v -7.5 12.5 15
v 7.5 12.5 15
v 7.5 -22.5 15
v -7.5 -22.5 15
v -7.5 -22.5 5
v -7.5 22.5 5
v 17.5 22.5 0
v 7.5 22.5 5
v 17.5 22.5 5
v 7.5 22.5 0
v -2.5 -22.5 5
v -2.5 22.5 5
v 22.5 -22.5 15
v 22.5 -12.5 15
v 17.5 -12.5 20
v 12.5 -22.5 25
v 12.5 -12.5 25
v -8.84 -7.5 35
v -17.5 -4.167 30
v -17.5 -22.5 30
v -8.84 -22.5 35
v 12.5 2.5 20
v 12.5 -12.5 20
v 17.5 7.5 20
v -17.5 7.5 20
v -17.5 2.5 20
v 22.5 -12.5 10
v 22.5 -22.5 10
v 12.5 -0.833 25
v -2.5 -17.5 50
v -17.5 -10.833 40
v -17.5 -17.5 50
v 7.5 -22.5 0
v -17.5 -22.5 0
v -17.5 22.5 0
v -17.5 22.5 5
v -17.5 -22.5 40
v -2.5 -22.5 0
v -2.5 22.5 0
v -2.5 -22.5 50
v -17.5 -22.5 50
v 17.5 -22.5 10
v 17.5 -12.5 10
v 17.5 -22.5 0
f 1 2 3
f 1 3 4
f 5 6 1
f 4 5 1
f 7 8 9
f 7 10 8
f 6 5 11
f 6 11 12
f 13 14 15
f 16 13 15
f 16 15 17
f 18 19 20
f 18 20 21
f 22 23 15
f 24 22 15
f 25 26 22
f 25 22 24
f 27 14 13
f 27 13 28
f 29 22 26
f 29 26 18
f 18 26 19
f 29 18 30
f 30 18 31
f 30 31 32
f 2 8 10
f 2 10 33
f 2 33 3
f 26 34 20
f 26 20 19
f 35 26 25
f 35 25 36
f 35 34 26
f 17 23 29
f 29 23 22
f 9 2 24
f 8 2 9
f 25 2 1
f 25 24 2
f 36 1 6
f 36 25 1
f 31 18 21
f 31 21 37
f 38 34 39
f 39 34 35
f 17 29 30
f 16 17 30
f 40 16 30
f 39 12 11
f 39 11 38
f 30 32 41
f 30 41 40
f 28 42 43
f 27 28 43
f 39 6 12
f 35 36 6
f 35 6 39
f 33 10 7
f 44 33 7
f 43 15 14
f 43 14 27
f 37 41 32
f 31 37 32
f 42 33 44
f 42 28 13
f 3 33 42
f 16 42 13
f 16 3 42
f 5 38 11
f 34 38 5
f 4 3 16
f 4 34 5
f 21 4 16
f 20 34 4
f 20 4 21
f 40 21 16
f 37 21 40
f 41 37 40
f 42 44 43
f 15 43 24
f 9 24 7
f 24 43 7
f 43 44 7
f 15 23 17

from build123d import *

# Parameters (mm, degrees)
SKETCH1_W           = 35
SKETCH1_H           = 45
BOSS_EXTRUDE2_DEPTH = 20
CUT_EXTRUDE1_DEPTH  = 46
CUT_EXTRUDE2_DEPTH  = 36
SKETCH5_W           = 10
SKETCH5_H           = 10
BOSS_EXTRUDE3_DEPTH = 5
CUT_EXTRUDE3_DEPTH  = 11
SKETCH7_W           = 30
SKETCH7_H           = 25
BOSS_EXTRUDE4_DEPTH = 30
SKETCH8_W           = 5
SKETCH8_H           = 10
BOSS_EXTRUDE5_DEPTH = 5
CUT_EXTRUDE4_DEPTH  = 11
SKETCH11_W          = 5
SKETCH11_H          = 45
BOSS_EXTRUDE6_DEPTH = 5
BOSS_EXTRUDE7_DEPTH = 5
CUT_EXTRUDE7_DEPTH  = 26
CUT_EXTRUDE8_DEPTH  = 26
CUT_EXTRUDE11_DEPTH = 41


with BuildPart() as part:
    # Sketch1 → Boss-Extrude2 (new body)
    with BuildSketch(Plane.XY):
        Rectangle(SKETCH1_W, SKETCH1_H)
    extrude(amount=BOSS_EXTRUDE2_DEPTH)

    # Sketch3 → Cut-Extrude1 (cut, through all)
    with BuildSketch(Plane(origin=(0, 22.5, 0), x_dir=(1, 0, 0), z_dir=(0, 1, 0))):
        Polygon((7.5, 0), (7.5, -15), (-12.5, -15), (-12.5, -5), (-7.5, -5), (-7.5, 0), align=None)
    extrude(amount=-CUT_EXTRUDE1_DEPTH, mode=Mode.SUBTRACT)

    # Sketch4 → Cut-Extrude2 (cut, through all)
    with BuildSketch(Plane(origin=(17.5, 0, 0), x_dir=(0, 0, -1), z_dir=(1, 0, 0))):
        Polygon((-5, 22.5), (-20, 7.5), (-20, 22.5), align=None)
    extrude(amount=-CUT_EXTRUDE2_DEPTH, mode=Mode.SUBTRACT)

    # Sketch5 → Boss-Extrude3 (add)
    with BuildSketch(Plane(origin=(17.5, 0, 0), x_dir=(0, 0, -1), z_dir=(1, 0, 0))):
        with Locations((-15, -17.5)):
            Rectangle(SKETCH5_W, SKETCH5_H)
    extrude(amount=BOSS_EXTRUDE3_DEPTH)

    # Sketch6 → Cut-Extrude3 (cut, through all)
    with BuildSketch(Plane(origin=(0, -12.5, 0), x_dir=(1, 0, 0), z_dir=(0, 1, 0))):
        Polygon((17.5, -20), (22.5, -15), (22.5, -20), align=None)
    extrude(amount=-CUT_EXTRUDE3_DEPTH, mode=Mode.SUBTRACT)

    # Sketch7 → Boss-Extrude4 (add)
    with BuildSketch(Plane.XY.offset(20)):
        with Locations((-2.5, -10)):
            Rectangle(SKETCH7_W, SKETCH7_H)
    extrude(amount=BOSS_EXTRUDE4_DEPTH)

    # Sketch8 → Boss-Extrude5 (add)
    with BuildSketch(Plane.XY.offset(20)):
        with Locations((15, -17.5)):
            Rectangle(SKETCH8_W, SKETCH8_H)
    extrude(amount=BOSS_EXTRUDE5_DEPTH)

    # Sketch9 → Cut-Extrude4 (cut, through all)
    with BuildSketch(Plane(origin=(0, -12.5, 0), x_dir=(1, 0, 0), z_dir=(0, 1, 0))):
        Polygon((17.5, -20), (12.5, -25), (17.5, -25), align=None)
    extrude(amount=-CUT_EXTRUDE4_DEPTH, mode=Mode.SUBTRACT)

    # Sketch11 → Boss-Extrude6 (add)
    with BuildSketch(Plane(origin=(-7.5, 0, 0), x_dir=(0, 0, -1), z_dir=(1, 0, 0))):
        with Locations((-2.5, 0)):
            Rectangle(SKETCH11_W, SKETCH11_H)
    extrude(amount=BOSS_EXTRUDE6_DEPTH)

    # Sketch12 → Boss-Extrude7 (add)
    with BuildSketch(Plane(origin=(-12.5, 0, 0), x_dir=(0, 0, -1), z_dir=(1, 0, 0))):
        Polygon((-5, 22.5), (-5, -22.5), (-15, -22.5), (-15, 12.5), align=None)
    extrude(amount=BOSS_EXTRUDE7_DEPTH)

    # Sketch13 → Cut-Extrude7 (cut, through all)
    with BuildSketch(Plane(origin=(0, 2.5, 0), x_dir=(1, 0, 0), z_dir=(0, 1, 0))):
        Polygon((12.5, -25), (-2.5, -50), (12.5, -50), align=None)
    extrude(amount=-CUT_EXTRUDE7_DEPTH, mode=Mode.SUBTRACT)

    # Sketch14 → Cut-Extrude8 (cut, through all)
    with BuildSketch(Plane(origin=(0, 2.5, 0), x_dir=(1, 0, 0), z_dir=(0, 1, 0))):
        Polygon((-17.5, -30), (-8.839745962, -35), (-17.5, -40), align=None)
    extrude(amount=-CUT_EXTRUDE8_DEPTH, mode=Mode.SUBTRACT)

    # Sketch15 → Cut-Extrude11 (cut, through all)
    with BuildSketch(Plane(origin=(-17.5, 0, 0), x_dir=(0, 0, -1), z_dir=(1, 0, 0))):
        Polygon((-20, 2.5), (-50, -17.5), (-50, 2.5), align=None)
    extrude(amount=CUT_EXTRUDE11_DEPTH, mode=Mode.SUBTRACT)


solid = part.part
